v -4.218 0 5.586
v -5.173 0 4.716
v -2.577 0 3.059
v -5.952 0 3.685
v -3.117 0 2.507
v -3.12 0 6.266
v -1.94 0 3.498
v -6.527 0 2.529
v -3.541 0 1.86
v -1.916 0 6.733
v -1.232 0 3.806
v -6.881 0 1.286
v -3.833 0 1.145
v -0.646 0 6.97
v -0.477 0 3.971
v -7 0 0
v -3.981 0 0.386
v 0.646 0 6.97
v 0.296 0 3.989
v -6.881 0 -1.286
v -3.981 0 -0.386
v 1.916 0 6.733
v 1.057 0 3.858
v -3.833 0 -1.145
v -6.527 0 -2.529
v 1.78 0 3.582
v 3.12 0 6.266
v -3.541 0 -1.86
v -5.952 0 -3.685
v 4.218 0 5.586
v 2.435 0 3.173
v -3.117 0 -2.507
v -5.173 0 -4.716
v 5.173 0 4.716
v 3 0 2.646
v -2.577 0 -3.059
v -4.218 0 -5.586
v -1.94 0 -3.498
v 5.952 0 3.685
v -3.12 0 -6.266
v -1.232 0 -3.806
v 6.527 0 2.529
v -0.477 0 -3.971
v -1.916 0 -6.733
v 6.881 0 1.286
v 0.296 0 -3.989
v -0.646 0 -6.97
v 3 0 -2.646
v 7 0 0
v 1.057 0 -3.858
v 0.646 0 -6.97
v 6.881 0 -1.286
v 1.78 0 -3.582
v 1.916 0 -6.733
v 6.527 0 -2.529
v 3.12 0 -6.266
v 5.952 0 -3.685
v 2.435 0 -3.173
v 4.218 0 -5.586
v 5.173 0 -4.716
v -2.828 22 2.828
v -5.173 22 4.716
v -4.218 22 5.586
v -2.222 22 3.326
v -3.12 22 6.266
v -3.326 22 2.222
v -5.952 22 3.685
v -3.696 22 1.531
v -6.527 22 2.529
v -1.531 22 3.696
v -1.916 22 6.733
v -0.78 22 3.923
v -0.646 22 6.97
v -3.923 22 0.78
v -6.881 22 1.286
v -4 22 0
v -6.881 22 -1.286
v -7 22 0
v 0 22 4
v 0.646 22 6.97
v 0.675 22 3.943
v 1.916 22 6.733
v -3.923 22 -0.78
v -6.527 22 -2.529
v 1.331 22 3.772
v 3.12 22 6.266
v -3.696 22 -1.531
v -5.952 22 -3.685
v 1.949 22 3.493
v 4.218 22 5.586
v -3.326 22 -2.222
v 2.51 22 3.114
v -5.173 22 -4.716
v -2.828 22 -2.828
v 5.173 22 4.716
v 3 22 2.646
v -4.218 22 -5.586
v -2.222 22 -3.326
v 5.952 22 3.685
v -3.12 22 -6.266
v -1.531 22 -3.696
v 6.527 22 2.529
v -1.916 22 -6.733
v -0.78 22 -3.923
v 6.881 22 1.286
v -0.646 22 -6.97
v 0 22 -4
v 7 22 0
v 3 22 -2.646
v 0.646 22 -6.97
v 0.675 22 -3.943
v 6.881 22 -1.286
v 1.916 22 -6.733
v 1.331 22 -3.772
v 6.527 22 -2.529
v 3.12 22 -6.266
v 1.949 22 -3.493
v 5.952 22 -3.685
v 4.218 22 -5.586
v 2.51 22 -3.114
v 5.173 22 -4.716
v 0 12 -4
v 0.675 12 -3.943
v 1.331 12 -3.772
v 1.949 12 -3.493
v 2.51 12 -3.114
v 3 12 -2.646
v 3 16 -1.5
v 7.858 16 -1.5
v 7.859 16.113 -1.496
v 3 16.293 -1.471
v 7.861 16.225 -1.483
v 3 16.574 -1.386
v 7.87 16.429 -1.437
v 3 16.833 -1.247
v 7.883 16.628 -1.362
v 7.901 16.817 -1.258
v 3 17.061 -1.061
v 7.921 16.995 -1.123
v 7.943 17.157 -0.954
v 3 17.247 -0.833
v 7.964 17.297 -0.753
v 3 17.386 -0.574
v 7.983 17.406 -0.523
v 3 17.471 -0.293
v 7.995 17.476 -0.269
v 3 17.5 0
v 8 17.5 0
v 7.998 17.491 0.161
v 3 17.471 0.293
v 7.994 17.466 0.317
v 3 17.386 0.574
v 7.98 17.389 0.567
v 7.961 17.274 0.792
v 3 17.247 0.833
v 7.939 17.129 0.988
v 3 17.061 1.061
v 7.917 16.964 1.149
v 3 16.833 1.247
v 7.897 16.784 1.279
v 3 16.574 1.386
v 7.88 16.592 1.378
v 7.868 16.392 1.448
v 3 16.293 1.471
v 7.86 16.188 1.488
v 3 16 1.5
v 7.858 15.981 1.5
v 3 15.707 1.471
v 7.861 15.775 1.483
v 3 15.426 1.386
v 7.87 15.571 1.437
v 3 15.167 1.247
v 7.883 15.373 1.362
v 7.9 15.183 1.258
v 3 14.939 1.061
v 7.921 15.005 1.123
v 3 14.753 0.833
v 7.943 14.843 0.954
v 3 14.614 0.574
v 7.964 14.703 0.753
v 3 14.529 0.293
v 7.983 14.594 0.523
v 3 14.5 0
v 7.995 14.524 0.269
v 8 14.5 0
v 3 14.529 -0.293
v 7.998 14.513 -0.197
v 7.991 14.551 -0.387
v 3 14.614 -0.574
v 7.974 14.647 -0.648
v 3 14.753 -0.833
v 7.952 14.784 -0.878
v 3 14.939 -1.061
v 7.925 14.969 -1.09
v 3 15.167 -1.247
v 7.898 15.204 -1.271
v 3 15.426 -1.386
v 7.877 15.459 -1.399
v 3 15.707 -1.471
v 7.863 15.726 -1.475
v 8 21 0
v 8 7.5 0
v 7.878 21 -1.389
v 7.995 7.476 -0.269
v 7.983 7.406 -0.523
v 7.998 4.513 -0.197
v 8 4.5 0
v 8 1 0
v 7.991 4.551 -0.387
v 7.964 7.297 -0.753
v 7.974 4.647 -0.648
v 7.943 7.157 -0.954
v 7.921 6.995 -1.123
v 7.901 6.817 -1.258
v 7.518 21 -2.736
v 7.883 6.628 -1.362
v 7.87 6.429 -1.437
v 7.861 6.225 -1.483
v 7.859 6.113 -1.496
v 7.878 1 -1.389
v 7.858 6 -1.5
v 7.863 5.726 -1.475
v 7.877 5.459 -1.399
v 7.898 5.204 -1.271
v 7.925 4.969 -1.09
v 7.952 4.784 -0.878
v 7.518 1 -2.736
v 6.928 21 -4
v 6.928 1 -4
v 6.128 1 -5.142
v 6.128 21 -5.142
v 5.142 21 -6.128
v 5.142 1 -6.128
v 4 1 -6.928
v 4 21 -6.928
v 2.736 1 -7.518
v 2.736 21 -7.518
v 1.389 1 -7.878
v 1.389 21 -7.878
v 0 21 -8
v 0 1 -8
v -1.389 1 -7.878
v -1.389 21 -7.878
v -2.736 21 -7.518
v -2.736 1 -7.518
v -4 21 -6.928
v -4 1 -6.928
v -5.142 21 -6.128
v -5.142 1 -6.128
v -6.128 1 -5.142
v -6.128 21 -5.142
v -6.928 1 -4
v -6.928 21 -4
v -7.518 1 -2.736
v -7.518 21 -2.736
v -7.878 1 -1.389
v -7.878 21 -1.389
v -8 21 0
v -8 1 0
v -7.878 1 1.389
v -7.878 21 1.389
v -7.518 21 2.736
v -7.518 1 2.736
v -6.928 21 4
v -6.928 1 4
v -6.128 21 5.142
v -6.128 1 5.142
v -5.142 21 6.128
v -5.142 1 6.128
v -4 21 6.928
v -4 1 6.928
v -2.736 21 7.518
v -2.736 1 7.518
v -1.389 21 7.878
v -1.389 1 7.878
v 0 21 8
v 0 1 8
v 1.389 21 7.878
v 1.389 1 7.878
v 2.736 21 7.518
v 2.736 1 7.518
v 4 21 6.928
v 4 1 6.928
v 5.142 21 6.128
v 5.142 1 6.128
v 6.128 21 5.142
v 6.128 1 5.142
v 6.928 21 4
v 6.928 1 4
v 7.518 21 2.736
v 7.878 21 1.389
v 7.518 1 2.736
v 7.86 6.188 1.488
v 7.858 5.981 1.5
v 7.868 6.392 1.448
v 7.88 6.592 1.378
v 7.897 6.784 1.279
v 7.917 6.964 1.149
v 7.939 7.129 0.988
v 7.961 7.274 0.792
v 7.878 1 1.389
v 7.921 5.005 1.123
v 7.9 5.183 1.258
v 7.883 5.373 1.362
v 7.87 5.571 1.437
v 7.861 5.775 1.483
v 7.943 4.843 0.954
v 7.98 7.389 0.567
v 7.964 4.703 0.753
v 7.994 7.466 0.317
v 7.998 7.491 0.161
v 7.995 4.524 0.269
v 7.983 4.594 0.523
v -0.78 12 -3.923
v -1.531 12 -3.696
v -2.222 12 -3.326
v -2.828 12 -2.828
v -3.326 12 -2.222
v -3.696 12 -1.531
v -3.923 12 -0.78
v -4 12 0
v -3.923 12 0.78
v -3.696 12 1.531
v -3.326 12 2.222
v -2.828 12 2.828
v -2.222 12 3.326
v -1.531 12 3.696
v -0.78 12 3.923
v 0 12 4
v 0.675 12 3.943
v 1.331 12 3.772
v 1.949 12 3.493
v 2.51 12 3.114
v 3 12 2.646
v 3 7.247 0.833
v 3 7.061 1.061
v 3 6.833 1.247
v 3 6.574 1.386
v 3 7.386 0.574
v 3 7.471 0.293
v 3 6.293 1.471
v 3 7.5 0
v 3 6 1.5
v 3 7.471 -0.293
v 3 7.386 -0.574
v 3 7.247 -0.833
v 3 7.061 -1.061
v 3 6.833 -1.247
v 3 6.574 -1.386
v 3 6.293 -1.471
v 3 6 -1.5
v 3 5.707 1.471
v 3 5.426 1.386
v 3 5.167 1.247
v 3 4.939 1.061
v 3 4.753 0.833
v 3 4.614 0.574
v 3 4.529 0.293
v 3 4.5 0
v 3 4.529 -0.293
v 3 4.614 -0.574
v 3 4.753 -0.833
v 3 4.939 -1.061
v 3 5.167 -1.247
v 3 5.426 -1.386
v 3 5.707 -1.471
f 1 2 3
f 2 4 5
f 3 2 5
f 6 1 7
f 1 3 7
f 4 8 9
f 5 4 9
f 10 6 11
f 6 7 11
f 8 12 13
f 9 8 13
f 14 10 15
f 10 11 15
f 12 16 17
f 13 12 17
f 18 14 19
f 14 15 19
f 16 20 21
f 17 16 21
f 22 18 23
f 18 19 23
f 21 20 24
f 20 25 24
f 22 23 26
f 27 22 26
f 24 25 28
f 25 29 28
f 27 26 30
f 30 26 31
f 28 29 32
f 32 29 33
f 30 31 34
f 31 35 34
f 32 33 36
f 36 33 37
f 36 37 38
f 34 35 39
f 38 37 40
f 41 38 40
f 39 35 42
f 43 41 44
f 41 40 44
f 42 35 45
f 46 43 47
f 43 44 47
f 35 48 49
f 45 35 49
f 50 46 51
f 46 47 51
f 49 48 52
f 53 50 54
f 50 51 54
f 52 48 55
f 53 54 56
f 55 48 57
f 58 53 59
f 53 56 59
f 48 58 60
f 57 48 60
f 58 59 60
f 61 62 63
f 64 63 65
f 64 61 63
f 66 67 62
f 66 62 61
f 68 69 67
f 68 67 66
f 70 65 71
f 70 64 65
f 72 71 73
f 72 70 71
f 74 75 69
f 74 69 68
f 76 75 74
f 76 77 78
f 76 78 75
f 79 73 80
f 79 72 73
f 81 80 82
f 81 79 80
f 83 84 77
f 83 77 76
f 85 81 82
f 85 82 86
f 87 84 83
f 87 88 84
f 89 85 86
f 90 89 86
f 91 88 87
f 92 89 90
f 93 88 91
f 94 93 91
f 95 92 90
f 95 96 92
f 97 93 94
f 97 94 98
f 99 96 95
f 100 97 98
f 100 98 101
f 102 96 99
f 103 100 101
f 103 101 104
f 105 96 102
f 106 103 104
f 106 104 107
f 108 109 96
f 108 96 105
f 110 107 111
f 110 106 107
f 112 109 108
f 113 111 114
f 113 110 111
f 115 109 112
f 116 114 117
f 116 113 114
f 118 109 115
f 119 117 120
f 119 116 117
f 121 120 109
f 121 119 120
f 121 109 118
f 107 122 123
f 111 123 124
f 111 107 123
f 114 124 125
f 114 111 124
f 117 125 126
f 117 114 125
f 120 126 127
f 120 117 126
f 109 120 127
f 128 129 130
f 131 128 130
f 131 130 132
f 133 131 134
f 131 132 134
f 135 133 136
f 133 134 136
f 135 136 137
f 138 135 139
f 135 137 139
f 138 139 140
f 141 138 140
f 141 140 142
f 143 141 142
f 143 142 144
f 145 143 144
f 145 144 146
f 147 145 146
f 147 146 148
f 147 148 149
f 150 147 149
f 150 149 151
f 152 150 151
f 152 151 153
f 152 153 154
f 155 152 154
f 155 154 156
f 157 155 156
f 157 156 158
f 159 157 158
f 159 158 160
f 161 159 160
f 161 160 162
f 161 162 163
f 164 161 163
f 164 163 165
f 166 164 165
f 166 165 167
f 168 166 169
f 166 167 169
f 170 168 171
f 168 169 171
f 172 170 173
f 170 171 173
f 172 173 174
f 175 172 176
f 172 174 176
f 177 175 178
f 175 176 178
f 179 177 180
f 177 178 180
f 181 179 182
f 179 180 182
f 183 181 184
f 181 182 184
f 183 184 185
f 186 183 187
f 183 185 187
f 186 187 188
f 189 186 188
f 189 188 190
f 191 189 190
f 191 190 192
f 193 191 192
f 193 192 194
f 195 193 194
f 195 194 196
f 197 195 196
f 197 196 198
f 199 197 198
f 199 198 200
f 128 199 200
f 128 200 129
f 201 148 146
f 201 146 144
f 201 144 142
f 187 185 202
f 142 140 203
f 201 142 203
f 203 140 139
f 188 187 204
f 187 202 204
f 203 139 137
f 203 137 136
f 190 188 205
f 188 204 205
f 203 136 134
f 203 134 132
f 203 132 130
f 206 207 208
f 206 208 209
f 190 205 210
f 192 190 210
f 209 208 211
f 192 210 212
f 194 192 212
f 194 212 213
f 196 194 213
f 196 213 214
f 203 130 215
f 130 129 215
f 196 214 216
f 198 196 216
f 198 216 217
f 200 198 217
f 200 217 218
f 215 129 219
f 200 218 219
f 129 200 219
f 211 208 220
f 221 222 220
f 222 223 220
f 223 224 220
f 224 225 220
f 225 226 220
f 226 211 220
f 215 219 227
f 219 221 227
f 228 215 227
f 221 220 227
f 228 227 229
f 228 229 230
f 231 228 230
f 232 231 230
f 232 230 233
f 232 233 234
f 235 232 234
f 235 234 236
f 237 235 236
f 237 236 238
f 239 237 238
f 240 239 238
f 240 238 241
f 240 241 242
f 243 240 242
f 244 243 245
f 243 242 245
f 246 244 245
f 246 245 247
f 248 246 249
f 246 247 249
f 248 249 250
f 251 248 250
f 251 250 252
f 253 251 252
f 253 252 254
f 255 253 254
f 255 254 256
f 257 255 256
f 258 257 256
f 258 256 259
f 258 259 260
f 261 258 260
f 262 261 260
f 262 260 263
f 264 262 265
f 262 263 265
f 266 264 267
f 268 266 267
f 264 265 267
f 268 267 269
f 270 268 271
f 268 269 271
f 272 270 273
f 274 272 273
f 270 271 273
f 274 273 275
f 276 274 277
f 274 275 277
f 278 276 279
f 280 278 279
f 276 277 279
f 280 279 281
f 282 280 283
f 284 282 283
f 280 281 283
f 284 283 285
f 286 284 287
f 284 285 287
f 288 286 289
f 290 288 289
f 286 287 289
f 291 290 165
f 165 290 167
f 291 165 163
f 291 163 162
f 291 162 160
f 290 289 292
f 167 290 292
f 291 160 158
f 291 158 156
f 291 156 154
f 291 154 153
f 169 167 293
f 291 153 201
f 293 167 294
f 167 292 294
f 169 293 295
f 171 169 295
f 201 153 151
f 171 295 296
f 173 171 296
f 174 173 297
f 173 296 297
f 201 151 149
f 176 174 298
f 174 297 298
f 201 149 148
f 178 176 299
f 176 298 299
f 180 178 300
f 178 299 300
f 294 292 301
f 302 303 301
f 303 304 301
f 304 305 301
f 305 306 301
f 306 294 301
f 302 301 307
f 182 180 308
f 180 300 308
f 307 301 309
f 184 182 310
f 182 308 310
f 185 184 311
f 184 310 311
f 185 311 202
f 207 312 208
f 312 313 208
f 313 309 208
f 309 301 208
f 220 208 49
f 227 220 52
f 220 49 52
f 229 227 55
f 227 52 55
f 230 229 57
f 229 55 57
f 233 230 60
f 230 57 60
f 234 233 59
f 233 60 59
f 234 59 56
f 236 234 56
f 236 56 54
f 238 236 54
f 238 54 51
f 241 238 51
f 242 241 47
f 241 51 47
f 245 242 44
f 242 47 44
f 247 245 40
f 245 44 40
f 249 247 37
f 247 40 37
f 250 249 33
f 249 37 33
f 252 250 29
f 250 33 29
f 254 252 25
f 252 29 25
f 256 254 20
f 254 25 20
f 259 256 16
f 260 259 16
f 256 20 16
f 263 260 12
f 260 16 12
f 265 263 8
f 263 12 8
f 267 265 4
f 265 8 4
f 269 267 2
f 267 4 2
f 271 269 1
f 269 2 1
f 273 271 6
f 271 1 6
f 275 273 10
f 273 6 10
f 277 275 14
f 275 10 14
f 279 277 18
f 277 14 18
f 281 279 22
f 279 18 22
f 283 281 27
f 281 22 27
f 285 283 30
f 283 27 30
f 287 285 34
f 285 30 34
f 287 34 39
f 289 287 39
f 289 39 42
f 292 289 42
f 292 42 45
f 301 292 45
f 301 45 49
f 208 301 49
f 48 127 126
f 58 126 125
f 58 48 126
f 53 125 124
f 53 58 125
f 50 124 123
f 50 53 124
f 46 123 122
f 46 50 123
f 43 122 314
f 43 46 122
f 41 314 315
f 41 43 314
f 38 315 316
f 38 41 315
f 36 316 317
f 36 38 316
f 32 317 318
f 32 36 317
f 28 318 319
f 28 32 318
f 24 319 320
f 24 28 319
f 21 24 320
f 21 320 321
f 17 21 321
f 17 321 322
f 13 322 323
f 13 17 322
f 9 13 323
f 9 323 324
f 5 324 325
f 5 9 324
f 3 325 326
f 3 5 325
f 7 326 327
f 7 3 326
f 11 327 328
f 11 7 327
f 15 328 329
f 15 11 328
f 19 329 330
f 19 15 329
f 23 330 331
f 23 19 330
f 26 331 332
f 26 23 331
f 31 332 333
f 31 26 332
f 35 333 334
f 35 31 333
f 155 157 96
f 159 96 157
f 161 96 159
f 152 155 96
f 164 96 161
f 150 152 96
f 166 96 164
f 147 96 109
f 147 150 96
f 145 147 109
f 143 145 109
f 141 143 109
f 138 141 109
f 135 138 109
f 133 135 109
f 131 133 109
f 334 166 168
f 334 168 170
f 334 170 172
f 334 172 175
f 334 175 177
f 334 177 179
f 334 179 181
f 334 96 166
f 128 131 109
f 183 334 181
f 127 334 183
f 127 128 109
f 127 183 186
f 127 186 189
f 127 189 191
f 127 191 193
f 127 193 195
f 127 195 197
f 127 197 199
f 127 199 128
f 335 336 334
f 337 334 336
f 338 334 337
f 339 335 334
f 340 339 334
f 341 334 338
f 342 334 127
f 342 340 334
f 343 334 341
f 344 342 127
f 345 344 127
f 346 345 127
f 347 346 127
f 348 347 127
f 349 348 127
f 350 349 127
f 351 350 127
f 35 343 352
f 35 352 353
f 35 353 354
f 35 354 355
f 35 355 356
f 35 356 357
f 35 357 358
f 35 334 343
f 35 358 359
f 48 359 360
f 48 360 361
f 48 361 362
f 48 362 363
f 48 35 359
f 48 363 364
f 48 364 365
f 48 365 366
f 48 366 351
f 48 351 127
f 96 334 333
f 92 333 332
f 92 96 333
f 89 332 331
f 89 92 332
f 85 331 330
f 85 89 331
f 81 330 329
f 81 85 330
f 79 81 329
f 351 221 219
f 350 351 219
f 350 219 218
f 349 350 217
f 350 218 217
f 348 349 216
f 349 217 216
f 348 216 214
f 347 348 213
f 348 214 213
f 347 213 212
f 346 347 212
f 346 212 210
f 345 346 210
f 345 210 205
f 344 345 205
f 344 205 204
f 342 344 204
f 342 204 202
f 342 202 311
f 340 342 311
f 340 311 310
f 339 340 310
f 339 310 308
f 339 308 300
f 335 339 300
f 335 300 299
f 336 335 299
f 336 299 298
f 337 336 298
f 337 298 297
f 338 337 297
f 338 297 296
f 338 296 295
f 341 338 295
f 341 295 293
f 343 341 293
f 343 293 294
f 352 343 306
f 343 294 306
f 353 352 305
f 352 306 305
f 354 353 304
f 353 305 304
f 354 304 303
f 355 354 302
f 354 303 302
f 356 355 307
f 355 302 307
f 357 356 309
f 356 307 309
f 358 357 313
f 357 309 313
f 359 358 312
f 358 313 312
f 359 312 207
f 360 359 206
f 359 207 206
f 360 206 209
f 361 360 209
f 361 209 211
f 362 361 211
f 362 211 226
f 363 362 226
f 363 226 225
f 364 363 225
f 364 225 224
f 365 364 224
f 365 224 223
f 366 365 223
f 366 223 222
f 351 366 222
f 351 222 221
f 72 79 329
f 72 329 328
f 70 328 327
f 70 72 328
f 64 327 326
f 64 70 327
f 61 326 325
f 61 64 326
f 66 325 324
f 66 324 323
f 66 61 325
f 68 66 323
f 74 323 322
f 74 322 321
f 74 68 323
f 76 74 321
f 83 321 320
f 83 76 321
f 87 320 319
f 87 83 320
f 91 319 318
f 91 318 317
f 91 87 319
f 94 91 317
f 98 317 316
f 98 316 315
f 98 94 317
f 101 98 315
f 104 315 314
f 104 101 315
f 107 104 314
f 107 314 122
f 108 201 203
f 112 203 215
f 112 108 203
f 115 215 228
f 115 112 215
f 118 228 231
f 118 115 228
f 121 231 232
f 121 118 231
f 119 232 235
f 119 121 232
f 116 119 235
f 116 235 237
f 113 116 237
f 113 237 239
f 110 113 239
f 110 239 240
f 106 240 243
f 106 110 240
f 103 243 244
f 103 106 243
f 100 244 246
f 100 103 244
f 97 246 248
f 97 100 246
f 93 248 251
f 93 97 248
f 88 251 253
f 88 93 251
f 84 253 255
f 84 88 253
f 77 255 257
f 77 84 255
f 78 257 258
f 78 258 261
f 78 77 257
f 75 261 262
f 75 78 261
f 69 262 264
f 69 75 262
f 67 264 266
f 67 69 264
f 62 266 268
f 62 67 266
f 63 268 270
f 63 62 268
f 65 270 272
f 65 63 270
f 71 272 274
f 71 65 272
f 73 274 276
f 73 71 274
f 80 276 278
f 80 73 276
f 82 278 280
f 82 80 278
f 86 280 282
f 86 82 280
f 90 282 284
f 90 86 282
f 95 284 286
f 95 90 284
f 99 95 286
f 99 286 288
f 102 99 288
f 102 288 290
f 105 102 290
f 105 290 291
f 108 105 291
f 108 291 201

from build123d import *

# Parameters (mm, degrees)
SKETCH1_R           = 8
BOSS_EXTRUDE1_DEPTH = 22
CUT_EXTRUDE3_DEPTH  = 12
CUT_EXTRUDE4_DEPTH  = 10
CHAMFER1_SIZE       = 1
CUT_EXTRUDE5_REACH  = 18
SKETCH4_R           = 1.5


with BuildPart() as part:
    # Sketch1 → Boss-Extrude1 (new body)
    with BuildSketch(Plane(origin=(0, 0, 0), x_dir=(1, 0, 0), z_dir=(0, 1, 0))):
        Circle(SKETCH1_R)
    extrude(amount=BOSS_EXTRUDE1_DEPTH)

    # Sketch3 → Cut-Extrude3 (cut)
    with BuildSketch(Plane.XZ):
        with BuildLine():
            Line((3, 2.645751311), (3, -2.645751311))
            ThreePointArc((3, -2.645751311), (-4, 0), (3, 2.645751311))
        make_face()
    extrude(amount=-CUT_EXTRUDE3_DEPTH, mode=Mode.SUBTRACT)

    # Sketch2 → Cut-Extrude4 (cut)
    with BuildSketch(Plane(origin=(0, 22, 0), x_dir=(1, 0, 0), z_dir=(0, 1, 0))):
        with BuildLine():
            Line((3, 2.645751311), (3, -2.645751311))
            ThreePointArc((3, -2.645751311), (1.645751311, -3.645751311), (0, -4))
            ThreePointArc((0, -4), (-4, 0), (0, 4))
            ThreePointArc((0, 4), (1.645751311, 3.645751311), (3, 2.645751311))
        make_face()
    extrude(amount=-CUT_EXTRUDE4_DEPTH, mode=Mode.SUBTRACT)

    # Chamfer1
    chamfer1_edges = [part.edges().sort_by_distance(p)[0] for p in [
        (-8, 0, 0),
        (-8, 22, 0),
    ]]
    chamfer(chamfer1_edges, length=CHAMFER1_SIZE)

    # Sketch4 → Cut-Extrude5 (cut, up to next)
    with BuildSketch(Plane(origin=(8, 0, 0), x_dir=(0, 0, -1), z_dir=(1, 0, 0)), mode=Mode.PRIVATE) as cut_extrude5_sk1:
        with Locations((0, 16)):
            Circle(SKETCH4_R)
    cut_extrude5_tool1 = extrude(cut_extrude5_sk1.sketch, amount=-CUT_EXTRUDE5_REACH, mode=Mode.PRIVATE) & part.part
    add(cut_extrude5_tool1.solids().sort_by_distance((8, 16, 0))[0], mode=Mode.SUBTRACT)
    # Sketch4 → Cut-Extrude5 (cut, up to next)
    with BuildSketch(Plane(origin=(8, 0, 0), x_dir=(0, 0, -1), z_dir=(1, 0, 0)), mode=Mode.PRIVATE) as cut_extrude5_sk2:
        with Locations((0, 6)):
            Circle(SKETCH4_R)
    cut_extrude5_tool2 = extrude(cut_extrude5_sk2.sketch, amount=-CUT_EXTRUDE5_REACH, mode=Mode.PRIVATE) & part.part
    add(cut_extrude5_tool2.solids().sort_by_distance((8, 6, 0))[0], mode=Mode.SUBTRACT)


solid = part.part
